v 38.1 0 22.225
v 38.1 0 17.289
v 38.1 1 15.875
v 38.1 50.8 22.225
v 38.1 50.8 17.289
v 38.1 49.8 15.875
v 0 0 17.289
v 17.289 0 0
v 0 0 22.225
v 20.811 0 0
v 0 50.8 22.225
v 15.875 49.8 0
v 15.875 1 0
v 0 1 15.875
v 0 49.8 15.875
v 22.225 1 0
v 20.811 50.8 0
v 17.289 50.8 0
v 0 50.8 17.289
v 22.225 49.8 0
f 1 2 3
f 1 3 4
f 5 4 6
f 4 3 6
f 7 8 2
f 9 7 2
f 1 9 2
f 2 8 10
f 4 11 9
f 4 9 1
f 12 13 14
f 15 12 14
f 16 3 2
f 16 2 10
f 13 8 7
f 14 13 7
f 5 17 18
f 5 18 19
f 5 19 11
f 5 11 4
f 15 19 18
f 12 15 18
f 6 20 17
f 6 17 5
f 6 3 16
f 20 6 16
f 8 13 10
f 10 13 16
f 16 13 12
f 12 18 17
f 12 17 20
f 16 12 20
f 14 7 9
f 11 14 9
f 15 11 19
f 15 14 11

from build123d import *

# Parameters (mm, degrees)
F0_W     = 38.1
F0_H     = 50.8
F1_DEPTH = 22.225
F3_DEPTH = 50.801
F4_SIZE  = 1


with BuildPart() as f1:
    # F0 (on Top) → F1 (new body)
    with BuildSketch(Plane.XY):
        with Locations((19.05, 25.4)):
            Rectangle(F0_W, F0_H)
    extrude(amount=F1_DEPTH)

    # F2 (on face) → F3 (cut, through all)
    with BuildSketch(Plane.XZ):
        Polygon((38.1, 15.875), (22.225, 0), (38.1, 0), align=None)
        Polygon((0, 0), (15.875, 0), (0, 15.875), align=None)
    extrude(amount=-F3_DEPTH, mode=Mode.SUBTRACT)

    # F4
    f4_edges = [f1.edges().sort_by_distance(p)[0] for p in [
        (30.1625, 0, 7.9375),
        (7.9375, 0, 7.9375),
        (30.1625, 50.8, 7.9375),
        (7.9375, 50.8, 7.9375),
    ]]
    chamfer(f4_edges, length=F4_SIZE)


solid = f1.part
